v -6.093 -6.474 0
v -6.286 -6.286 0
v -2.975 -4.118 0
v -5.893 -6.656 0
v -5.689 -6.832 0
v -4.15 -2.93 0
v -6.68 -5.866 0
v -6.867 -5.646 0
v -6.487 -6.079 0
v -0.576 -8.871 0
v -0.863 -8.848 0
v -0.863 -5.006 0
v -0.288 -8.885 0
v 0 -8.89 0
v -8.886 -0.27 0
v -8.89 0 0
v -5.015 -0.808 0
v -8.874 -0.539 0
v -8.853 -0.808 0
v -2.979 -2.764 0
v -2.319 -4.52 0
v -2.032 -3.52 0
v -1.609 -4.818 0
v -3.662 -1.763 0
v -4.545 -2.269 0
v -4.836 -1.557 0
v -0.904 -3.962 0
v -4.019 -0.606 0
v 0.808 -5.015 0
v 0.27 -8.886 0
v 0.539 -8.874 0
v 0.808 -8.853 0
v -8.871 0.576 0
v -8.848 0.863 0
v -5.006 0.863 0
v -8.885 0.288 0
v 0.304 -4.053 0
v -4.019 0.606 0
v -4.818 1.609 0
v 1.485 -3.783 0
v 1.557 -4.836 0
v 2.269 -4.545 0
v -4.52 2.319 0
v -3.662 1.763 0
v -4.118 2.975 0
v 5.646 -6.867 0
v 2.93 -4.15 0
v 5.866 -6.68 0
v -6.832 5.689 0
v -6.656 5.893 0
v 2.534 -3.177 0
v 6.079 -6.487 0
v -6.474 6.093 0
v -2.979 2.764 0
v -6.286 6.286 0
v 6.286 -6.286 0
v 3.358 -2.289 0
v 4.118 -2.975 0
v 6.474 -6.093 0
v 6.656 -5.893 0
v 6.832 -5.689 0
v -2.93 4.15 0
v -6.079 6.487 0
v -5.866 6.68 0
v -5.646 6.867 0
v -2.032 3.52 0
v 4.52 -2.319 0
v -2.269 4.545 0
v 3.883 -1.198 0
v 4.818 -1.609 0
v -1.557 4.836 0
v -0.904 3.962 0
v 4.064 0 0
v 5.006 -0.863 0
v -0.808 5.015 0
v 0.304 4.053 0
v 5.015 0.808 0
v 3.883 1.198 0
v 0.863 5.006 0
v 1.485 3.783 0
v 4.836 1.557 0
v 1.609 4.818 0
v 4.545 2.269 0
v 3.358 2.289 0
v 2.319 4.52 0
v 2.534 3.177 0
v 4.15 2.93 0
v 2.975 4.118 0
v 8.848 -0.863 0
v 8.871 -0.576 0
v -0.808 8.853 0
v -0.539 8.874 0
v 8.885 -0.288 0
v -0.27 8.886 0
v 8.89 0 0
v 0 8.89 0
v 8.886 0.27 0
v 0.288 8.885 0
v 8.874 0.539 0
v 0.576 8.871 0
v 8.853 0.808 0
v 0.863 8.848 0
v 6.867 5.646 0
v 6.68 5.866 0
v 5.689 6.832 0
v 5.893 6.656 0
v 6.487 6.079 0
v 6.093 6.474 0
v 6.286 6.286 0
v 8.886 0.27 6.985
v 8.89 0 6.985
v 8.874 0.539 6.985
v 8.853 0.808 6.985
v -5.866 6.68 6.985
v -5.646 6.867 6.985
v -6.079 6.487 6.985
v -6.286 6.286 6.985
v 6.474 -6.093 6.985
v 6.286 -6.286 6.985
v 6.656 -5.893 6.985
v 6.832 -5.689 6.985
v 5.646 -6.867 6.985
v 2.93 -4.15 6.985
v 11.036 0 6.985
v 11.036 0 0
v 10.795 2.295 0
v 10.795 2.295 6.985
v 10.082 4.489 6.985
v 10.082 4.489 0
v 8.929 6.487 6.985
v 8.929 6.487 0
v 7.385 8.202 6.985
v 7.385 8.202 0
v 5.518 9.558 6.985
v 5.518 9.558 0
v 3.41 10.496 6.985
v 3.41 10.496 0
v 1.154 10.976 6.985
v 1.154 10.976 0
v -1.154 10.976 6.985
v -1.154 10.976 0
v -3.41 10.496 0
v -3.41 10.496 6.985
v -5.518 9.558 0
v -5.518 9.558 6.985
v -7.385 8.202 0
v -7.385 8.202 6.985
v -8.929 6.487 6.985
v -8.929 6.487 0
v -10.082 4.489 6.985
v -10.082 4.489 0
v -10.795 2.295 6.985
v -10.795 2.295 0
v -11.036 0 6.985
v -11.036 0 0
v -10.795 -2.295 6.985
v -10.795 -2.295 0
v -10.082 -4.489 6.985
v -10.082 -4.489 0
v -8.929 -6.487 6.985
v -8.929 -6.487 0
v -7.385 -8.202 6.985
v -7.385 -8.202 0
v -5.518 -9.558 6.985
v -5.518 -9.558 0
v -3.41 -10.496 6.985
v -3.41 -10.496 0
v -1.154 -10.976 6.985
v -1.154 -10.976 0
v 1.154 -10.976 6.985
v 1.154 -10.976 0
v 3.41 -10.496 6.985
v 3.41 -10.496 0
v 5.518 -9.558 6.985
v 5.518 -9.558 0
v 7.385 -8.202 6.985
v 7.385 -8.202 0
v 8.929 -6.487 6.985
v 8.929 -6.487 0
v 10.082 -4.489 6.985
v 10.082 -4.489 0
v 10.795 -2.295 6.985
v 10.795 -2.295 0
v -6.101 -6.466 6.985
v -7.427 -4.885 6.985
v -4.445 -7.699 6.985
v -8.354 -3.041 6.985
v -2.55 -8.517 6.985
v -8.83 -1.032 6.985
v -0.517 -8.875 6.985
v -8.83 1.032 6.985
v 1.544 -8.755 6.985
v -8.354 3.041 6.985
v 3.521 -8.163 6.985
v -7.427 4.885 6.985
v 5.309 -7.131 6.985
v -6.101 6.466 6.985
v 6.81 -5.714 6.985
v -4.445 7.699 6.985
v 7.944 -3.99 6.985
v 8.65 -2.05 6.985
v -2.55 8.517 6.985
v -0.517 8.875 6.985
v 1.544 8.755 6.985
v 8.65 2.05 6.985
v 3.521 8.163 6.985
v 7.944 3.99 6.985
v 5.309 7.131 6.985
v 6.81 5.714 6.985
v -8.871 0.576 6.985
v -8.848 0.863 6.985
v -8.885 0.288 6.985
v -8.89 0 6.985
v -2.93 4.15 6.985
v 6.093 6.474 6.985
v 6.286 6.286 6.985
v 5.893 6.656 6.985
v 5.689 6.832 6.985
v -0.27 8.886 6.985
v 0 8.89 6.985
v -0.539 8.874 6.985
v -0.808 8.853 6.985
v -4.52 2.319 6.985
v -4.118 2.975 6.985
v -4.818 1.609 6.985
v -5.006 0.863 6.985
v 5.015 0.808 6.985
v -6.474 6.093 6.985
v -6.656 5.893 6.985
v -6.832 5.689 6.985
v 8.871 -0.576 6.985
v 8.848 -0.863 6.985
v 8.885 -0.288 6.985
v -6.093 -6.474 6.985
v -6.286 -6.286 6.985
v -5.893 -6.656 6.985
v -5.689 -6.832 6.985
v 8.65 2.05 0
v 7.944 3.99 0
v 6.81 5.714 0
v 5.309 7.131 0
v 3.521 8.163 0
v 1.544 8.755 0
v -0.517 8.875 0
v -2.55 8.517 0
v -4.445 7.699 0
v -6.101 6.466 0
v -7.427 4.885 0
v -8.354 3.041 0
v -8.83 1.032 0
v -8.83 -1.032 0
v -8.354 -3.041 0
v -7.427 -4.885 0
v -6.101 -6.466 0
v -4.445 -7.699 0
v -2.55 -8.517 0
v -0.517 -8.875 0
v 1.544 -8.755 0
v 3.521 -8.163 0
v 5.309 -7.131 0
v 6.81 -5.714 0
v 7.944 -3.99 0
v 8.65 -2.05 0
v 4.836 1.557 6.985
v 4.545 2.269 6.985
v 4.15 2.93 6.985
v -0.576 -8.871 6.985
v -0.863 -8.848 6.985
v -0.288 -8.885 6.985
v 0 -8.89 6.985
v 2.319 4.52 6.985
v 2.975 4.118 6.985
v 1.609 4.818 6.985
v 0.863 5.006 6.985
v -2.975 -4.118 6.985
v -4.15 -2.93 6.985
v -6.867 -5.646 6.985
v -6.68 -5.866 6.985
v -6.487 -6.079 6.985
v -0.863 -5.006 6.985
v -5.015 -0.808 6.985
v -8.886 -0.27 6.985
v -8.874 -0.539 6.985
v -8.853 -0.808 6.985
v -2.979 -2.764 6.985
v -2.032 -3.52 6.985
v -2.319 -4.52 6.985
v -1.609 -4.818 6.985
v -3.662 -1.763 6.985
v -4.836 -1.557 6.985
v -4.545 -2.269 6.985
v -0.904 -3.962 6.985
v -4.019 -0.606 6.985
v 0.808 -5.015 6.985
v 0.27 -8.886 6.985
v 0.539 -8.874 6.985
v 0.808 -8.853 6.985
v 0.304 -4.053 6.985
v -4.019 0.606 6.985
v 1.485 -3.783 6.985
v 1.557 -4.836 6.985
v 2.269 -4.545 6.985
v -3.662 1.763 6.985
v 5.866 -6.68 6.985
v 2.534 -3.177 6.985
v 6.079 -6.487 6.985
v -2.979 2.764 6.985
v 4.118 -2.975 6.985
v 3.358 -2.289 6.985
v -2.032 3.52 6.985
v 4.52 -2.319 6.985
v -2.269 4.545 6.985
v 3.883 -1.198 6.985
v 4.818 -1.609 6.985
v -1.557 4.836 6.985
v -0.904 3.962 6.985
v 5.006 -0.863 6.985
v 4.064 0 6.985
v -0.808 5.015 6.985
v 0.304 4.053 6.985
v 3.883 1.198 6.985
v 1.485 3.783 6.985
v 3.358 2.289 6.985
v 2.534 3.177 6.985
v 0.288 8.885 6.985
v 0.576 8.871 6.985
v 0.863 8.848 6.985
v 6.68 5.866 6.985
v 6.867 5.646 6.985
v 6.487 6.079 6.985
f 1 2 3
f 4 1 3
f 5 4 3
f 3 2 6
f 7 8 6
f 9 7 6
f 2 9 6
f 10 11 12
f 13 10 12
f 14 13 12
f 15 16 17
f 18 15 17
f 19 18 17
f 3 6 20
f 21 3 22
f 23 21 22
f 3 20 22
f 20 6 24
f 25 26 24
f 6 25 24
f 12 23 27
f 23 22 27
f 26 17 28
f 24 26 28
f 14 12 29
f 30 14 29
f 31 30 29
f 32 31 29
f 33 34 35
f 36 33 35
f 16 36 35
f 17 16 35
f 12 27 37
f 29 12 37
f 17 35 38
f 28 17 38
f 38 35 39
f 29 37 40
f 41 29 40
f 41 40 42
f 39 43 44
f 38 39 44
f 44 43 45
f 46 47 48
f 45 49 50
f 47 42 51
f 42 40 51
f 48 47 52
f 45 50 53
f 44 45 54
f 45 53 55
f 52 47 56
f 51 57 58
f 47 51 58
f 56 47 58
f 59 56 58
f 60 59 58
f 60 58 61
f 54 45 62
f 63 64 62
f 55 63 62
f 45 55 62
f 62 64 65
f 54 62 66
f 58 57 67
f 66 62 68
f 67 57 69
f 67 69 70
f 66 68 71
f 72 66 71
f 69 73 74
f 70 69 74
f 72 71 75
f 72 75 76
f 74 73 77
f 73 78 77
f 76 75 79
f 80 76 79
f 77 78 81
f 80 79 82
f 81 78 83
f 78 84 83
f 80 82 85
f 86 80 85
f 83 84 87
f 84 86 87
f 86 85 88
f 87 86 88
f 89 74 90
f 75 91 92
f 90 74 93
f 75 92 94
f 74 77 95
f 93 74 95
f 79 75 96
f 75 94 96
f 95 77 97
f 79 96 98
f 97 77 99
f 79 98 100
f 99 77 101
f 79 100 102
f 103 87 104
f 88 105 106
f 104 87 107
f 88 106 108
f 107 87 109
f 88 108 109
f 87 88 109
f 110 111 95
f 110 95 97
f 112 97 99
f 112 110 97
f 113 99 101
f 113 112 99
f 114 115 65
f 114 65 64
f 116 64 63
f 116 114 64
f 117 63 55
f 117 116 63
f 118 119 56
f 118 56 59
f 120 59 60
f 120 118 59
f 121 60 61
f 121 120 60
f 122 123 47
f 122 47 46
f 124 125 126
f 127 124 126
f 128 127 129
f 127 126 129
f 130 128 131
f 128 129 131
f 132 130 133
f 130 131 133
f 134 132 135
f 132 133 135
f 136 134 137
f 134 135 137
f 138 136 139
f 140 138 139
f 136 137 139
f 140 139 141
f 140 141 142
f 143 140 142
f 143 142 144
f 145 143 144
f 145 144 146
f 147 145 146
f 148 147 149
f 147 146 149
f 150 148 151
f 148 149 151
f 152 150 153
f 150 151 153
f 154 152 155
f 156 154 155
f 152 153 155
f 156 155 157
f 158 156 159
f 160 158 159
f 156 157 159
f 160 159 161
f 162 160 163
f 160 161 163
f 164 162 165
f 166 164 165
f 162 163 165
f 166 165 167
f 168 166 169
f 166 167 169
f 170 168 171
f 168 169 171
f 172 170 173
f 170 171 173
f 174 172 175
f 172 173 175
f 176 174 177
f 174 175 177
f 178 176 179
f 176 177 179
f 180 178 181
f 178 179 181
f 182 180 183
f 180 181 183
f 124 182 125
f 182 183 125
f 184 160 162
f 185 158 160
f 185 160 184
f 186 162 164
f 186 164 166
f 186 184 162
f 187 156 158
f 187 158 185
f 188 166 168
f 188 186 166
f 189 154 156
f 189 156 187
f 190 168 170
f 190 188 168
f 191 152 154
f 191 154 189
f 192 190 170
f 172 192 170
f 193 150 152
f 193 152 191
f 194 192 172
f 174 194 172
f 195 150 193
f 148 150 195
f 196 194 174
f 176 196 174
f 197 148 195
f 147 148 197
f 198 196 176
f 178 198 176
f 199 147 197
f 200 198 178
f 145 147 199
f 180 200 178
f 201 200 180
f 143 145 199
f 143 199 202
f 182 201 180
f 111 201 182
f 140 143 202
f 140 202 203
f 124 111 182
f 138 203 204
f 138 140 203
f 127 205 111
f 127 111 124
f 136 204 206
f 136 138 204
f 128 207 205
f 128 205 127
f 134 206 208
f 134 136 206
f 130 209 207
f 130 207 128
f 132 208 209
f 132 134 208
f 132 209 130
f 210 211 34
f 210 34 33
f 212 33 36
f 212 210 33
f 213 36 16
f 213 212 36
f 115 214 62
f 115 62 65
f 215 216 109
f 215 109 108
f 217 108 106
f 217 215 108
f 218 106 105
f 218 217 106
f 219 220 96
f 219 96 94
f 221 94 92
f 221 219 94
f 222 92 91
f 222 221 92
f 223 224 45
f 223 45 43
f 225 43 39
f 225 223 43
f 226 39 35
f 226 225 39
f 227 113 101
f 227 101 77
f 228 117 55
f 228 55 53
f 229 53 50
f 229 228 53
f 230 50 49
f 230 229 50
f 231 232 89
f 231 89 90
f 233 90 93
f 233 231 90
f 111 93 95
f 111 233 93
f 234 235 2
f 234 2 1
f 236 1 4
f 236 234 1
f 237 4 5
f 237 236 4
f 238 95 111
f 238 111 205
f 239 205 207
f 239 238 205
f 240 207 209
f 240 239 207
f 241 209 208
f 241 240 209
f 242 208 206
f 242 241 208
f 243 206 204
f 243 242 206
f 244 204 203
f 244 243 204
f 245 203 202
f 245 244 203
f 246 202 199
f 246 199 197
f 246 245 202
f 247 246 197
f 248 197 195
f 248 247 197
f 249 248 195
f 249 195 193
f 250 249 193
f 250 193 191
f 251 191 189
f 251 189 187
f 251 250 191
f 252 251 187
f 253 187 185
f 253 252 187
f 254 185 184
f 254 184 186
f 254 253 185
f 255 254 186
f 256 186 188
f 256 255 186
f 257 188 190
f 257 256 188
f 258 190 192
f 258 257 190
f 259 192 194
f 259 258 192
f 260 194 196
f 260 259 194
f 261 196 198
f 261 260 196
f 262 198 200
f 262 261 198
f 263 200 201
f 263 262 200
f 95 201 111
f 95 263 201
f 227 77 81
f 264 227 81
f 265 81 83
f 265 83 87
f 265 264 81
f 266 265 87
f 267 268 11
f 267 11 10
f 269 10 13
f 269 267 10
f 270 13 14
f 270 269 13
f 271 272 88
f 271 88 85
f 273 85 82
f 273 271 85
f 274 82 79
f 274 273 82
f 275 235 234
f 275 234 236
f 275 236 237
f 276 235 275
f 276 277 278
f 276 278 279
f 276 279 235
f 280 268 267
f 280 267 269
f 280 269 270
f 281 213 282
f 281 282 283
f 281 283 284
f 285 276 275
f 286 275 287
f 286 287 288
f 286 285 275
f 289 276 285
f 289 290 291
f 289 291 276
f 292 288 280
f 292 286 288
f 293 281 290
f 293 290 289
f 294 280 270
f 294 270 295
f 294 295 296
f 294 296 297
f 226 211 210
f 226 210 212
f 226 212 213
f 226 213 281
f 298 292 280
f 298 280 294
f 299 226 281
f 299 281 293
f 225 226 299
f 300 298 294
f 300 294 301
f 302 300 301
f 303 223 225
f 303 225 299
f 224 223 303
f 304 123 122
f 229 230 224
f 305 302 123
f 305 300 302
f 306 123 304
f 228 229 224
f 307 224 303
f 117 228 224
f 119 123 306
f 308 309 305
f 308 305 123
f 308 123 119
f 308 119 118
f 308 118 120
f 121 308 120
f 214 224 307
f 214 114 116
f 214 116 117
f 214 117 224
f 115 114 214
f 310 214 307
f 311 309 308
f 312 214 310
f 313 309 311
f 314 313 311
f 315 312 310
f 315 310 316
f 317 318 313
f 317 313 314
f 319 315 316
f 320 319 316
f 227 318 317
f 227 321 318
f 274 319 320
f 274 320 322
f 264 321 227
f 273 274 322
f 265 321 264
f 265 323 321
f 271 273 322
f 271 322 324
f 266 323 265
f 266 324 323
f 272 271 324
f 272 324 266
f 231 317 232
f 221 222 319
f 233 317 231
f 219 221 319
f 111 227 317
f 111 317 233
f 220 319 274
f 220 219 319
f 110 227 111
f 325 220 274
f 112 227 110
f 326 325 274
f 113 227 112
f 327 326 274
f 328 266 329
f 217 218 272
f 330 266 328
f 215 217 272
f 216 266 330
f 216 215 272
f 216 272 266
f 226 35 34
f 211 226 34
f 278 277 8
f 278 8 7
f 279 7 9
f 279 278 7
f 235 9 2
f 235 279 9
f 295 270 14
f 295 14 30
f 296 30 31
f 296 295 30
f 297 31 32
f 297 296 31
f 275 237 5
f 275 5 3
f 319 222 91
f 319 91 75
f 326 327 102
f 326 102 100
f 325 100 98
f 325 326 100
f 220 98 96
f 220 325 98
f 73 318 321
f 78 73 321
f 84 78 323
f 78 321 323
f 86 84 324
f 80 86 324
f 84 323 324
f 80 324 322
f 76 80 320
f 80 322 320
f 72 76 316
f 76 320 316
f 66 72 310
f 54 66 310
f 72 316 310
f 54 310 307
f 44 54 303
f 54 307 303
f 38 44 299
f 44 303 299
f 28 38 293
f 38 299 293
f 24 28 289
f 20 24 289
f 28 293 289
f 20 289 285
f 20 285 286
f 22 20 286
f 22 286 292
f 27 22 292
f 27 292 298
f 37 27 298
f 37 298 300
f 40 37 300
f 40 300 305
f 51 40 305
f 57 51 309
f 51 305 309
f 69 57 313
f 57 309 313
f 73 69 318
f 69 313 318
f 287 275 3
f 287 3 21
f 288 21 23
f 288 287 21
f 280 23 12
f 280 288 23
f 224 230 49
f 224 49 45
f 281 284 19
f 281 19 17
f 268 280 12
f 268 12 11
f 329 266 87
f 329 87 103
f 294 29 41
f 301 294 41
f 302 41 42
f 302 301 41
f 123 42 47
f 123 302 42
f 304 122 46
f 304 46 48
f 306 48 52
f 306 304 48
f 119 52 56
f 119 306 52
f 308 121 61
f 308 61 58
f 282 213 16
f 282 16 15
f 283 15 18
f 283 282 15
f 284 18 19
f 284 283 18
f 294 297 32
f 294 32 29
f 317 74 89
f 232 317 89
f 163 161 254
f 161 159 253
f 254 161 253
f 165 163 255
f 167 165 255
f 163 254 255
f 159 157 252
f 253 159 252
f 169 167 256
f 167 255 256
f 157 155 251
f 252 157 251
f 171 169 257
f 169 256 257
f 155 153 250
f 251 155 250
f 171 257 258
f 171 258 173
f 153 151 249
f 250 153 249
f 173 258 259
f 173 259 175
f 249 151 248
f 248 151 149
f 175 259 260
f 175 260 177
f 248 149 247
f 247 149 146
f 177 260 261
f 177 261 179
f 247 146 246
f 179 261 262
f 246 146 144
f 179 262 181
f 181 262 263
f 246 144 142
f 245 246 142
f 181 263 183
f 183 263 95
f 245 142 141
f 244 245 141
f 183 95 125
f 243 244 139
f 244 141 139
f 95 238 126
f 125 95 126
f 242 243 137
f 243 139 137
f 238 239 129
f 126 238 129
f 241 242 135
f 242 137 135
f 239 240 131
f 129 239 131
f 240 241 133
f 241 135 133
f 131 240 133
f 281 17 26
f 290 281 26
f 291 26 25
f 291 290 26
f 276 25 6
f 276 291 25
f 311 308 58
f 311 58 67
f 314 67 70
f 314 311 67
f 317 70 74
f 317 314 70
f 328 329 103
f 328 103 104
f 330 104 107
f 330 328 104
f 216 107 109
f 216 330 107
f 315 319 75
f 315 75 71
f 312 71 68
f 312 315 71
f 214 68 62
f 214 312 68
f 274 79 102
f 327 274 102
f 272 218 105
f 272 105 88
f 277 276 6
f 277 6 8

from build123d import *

# Parameters (mm, degrees)
F0_R     = 11.0363
F0_R_2   = 8.89
F1_DEPTH = 6.985
F3_R     = 5.08
F3_R_2   = 4.064
F4_DEPTH = 6.985
F6_DEPTH = 6.985


with BuildPart() as f1:
    # F0 (on Top) → F1 (new body)
    with BuildSketch(Plane.XY):
        Circle(F0_R)
        Circle(F0_R_2, mode=Mode.SUBTRACT)
    extrude(amount=F1_DEPTH)


with BuildPart() as f4:
    # F3 (on face) → F4 (new body)
    with BuildSketch(Plane.XY.offset(6.985)):
        Circle(F3_R)
        Circle(F3_R_2, mode=Mode.SUBTRACT)
    extrude(amount=-F4_DEPTH)

    # F5 (on face) → F6 (join)
    with BuildSketch(Plane.XY.offset(6.985)):
        with BuildLine():
            Line((0, 8.89), (0, 4.588752985))
            Line((0, 4.588752985), (0.8629788063, 4.588752985))
            Line((0.8629788063, 4.588752985), (0.8629788063, 8.8480148949))
            ThreePointArc((0.8629788063, 8.8480148949), (0.4319997596, 8.87949752), (0, 8.89))
        make_face()
        with BuildLine():
            Line((-0.8083467255, 4.6136979945), (0, 4.588752985))
            Line((0, 4.588752985), (0, 8.89))
            ThreePointArc((0, 8.89), (-0.404592586, 8.8807885258), (-0.8083467255, 8.8531731922))
            Line((-0.8083467255, 8.8531731922), (-0.8083467255, 4.6136979945))
        make_face()
        with BuildLine():
            Line((-3.2447383529, 3.2447383529), (-6.2861792847, 6.2861792847))
            ThreePointArc((-6.2861792847, 6.2861792847), (-6.56575595, 5.9935756277), (-6.8317262504, 5.6885513481))
            Line((-6.8317262504, 5.6885513481), (-3.8339645894, 2.6907896871))
            Line((-3.8339645894, 2.6907896871), (-3.2447383529, 3.2447383529))
        make_face()
        with BuildLine():
            Line((-4.588752985, 0.8629788063), (-8.8480148949, 0.8629788063))
            ThreePointArc((-8.8480148949, 0.8629788063), (-8.87949752, 0.4319997596), (-8.89, 0))
            Line((-8.89, 0), (-4.588752985, 0))
            Line((-4.588752985, 0), (-4.588752985, 0.8629788063))
        make_face()
        with BuildLine():
            Line((-4.588752985, 0), (-8.89, 0))
            ThreePointArc((-8.89, 0), (-8.8807885258, -0.404592586), (-8.8531731922, -0.8083467255))
            Line((-8.8531731922, -0.8083467255), (-4.6136979945, -0.8083467255))
            Line((-4.6136979945, -0.8083467255), (-4.588752985, 0))
        make_face()
        with BuildLine():
            Line((-3.8549565188, -2.634520187), (-6.8667094981, -5.6462731663))
            ThreePointArc((-6.8667094981, -5.6462731663), (-6.5842228694, -5.9732829505), (-6.2861792847, -6.2861792847))
            Line((-6.2861792847, -6.2861792847), (-3.2447383529, -3.2447383529))
            Line((-3.2447383529, -3.2447383529), (-3.8549565188, -2.634520187))
        make_face()
        with BuildLine():
            Line((-3.2447383529, -3.2447383529), (-6.2861792847, -6.2861792847))
            ThreePointArc((-6.2861792847, -6.2861792847), (-5.9935756277, -6.56575595), (-5.6885513481, -6.8317262504))
            Line((-5.6885513481, -6.8317262504), (-2.6907896871, -3.8339645894))
            Line((-2.6907896871, -3.8339645894), (-3.2447383529, -3.2447383529))
        make_face()
        with BuildLine():
            Line((-0.8629788063, -4.588752985), (-0.8629788063, -8.8480148949))
            ThreePointArc((-0.8629788063, -8.8480148949), (-0.4319997596, -8.87949752), (0, -8.89))
            Line((0, -8.89), (0, -4.588752985))
            Line((0, -4.588752985), (-0.8629788063, -4.588752985))
        make_face()
        with BuildLine():
            ThreePointArc((0, -8.89), (0.404592586, -8.8807885258), (0.8083467255, -8.8531731922))
            Line((0.8083467255, -8.8531731922), (0.8083467255, -4.6136979945))
            Line((0.8083467255, -4.6136979945), (0, -4.588752985))
            Line((0, -4.588752985), (0, -8.89))
        make_face()
        with BuildLine():
            ThreePointArc((5.6462731663, -6.8667094981), (5.9732829505, -6.5842228694), (6.2861792847, -6.2861792847))
            Line((6.2861792847, -6.2861792847), (3.2447383529, -3.2447383529))
            Line((3.2447383529, -3.2447383529), (2.634520187, -3.8549565188))
            Line((2.634520187, -3.8549565188), (5.6462731663, -6.8667094981))
        make_face()
        with BuildLine():
            ThreePointArc((6.2861792847, -6.2861792847), (6.56575595, -5.9935756277), (6.8317262504, -5.6885513481))
            Line((6.8317262504, -5.6885513481), (3.8339645894, -2.6907896871))
            Line((3.8339645894, -2.6907896871), (3.2447383529, -3.2447383529))
            Line((3.2447383529, -3.2447383529), (6.2861792847, -6.2861792847))
        make_face()
        with BuildLine():
            ThreePointArc((8.8480148949, -0.8629788063), (8.87949752, -0.4319997596), (8.89, 0))
            Line((8.89, 0), (4.588752985, 0))
            Line((4.588752985, 0), (4.588752985, -0.8629788063))
            Line((4.588752985, -0.8629788063), (8.8480148949, -0.8629788063))
        make_face()
        with BuildLine():
            ThreePointArc((8.89, 0), (8.8807885258, 0.404592586), (8.8531731922, 0.8083467255))
            Line((8.8531731922, 0.8083467255), (4.6136979945, 0.8083467255))
            Line((4.6136979945, 0.8083467255), (4.588752985, 0))
            Line((4.588752985, 0), (8.89, 0))
        make_face()
        with BuildLine():
            ThreePointArc((6.8667094981, 5.6462731663), (6.5842228694, 5.9732829505), (6.2861792847, 6.2861792847))
            Line((6.2861792847, 6.2861792847), (3.2447383529, 3.2447383529))
            Line((3.2447383529, 3.2447383529), (3.8549565188, 2.634520187))
            Line((3.8549565188, 2.634520187), (6.8667094981, 5.6462731663))
        make_face()
        with BuildLine():
            ThreePointArc((6.2861792847, 6.2861792847), (5.9935756277, 6.56575595), (5.6885513481, 6.8317262504))
            Line((5.6885513481, 6.8317262504), (2.6907896871, 3.8339645894))
            Line((2.6907896871, 3.8339645894), (3.2447383529, 3.2447383529))
            Line((3.2447383529, 3.2447383529), (6.2861792847, 6.2861792847))
        make_face()
        with BuildLine():
            Line((-2.634520187, 3.8549565188), (-5.6462731663, 6.8667094981))
            ThreePointArc((-5.6462731663, 6.8667094981), (-5.9732829505, 6.5842228694), (-6.2861792847, 6.2861792847))
            Line((-6.2861792847, 6.2861792847), (-3.2447383529, 3.2447383529))
            Line((-3.2447383529, 3.2447383529), (-2.634520187, 3.8549565188))
        make_face()
    extrude(amount=-F6_DEPTH)


solid = Compound([f1.part, f4.part])
